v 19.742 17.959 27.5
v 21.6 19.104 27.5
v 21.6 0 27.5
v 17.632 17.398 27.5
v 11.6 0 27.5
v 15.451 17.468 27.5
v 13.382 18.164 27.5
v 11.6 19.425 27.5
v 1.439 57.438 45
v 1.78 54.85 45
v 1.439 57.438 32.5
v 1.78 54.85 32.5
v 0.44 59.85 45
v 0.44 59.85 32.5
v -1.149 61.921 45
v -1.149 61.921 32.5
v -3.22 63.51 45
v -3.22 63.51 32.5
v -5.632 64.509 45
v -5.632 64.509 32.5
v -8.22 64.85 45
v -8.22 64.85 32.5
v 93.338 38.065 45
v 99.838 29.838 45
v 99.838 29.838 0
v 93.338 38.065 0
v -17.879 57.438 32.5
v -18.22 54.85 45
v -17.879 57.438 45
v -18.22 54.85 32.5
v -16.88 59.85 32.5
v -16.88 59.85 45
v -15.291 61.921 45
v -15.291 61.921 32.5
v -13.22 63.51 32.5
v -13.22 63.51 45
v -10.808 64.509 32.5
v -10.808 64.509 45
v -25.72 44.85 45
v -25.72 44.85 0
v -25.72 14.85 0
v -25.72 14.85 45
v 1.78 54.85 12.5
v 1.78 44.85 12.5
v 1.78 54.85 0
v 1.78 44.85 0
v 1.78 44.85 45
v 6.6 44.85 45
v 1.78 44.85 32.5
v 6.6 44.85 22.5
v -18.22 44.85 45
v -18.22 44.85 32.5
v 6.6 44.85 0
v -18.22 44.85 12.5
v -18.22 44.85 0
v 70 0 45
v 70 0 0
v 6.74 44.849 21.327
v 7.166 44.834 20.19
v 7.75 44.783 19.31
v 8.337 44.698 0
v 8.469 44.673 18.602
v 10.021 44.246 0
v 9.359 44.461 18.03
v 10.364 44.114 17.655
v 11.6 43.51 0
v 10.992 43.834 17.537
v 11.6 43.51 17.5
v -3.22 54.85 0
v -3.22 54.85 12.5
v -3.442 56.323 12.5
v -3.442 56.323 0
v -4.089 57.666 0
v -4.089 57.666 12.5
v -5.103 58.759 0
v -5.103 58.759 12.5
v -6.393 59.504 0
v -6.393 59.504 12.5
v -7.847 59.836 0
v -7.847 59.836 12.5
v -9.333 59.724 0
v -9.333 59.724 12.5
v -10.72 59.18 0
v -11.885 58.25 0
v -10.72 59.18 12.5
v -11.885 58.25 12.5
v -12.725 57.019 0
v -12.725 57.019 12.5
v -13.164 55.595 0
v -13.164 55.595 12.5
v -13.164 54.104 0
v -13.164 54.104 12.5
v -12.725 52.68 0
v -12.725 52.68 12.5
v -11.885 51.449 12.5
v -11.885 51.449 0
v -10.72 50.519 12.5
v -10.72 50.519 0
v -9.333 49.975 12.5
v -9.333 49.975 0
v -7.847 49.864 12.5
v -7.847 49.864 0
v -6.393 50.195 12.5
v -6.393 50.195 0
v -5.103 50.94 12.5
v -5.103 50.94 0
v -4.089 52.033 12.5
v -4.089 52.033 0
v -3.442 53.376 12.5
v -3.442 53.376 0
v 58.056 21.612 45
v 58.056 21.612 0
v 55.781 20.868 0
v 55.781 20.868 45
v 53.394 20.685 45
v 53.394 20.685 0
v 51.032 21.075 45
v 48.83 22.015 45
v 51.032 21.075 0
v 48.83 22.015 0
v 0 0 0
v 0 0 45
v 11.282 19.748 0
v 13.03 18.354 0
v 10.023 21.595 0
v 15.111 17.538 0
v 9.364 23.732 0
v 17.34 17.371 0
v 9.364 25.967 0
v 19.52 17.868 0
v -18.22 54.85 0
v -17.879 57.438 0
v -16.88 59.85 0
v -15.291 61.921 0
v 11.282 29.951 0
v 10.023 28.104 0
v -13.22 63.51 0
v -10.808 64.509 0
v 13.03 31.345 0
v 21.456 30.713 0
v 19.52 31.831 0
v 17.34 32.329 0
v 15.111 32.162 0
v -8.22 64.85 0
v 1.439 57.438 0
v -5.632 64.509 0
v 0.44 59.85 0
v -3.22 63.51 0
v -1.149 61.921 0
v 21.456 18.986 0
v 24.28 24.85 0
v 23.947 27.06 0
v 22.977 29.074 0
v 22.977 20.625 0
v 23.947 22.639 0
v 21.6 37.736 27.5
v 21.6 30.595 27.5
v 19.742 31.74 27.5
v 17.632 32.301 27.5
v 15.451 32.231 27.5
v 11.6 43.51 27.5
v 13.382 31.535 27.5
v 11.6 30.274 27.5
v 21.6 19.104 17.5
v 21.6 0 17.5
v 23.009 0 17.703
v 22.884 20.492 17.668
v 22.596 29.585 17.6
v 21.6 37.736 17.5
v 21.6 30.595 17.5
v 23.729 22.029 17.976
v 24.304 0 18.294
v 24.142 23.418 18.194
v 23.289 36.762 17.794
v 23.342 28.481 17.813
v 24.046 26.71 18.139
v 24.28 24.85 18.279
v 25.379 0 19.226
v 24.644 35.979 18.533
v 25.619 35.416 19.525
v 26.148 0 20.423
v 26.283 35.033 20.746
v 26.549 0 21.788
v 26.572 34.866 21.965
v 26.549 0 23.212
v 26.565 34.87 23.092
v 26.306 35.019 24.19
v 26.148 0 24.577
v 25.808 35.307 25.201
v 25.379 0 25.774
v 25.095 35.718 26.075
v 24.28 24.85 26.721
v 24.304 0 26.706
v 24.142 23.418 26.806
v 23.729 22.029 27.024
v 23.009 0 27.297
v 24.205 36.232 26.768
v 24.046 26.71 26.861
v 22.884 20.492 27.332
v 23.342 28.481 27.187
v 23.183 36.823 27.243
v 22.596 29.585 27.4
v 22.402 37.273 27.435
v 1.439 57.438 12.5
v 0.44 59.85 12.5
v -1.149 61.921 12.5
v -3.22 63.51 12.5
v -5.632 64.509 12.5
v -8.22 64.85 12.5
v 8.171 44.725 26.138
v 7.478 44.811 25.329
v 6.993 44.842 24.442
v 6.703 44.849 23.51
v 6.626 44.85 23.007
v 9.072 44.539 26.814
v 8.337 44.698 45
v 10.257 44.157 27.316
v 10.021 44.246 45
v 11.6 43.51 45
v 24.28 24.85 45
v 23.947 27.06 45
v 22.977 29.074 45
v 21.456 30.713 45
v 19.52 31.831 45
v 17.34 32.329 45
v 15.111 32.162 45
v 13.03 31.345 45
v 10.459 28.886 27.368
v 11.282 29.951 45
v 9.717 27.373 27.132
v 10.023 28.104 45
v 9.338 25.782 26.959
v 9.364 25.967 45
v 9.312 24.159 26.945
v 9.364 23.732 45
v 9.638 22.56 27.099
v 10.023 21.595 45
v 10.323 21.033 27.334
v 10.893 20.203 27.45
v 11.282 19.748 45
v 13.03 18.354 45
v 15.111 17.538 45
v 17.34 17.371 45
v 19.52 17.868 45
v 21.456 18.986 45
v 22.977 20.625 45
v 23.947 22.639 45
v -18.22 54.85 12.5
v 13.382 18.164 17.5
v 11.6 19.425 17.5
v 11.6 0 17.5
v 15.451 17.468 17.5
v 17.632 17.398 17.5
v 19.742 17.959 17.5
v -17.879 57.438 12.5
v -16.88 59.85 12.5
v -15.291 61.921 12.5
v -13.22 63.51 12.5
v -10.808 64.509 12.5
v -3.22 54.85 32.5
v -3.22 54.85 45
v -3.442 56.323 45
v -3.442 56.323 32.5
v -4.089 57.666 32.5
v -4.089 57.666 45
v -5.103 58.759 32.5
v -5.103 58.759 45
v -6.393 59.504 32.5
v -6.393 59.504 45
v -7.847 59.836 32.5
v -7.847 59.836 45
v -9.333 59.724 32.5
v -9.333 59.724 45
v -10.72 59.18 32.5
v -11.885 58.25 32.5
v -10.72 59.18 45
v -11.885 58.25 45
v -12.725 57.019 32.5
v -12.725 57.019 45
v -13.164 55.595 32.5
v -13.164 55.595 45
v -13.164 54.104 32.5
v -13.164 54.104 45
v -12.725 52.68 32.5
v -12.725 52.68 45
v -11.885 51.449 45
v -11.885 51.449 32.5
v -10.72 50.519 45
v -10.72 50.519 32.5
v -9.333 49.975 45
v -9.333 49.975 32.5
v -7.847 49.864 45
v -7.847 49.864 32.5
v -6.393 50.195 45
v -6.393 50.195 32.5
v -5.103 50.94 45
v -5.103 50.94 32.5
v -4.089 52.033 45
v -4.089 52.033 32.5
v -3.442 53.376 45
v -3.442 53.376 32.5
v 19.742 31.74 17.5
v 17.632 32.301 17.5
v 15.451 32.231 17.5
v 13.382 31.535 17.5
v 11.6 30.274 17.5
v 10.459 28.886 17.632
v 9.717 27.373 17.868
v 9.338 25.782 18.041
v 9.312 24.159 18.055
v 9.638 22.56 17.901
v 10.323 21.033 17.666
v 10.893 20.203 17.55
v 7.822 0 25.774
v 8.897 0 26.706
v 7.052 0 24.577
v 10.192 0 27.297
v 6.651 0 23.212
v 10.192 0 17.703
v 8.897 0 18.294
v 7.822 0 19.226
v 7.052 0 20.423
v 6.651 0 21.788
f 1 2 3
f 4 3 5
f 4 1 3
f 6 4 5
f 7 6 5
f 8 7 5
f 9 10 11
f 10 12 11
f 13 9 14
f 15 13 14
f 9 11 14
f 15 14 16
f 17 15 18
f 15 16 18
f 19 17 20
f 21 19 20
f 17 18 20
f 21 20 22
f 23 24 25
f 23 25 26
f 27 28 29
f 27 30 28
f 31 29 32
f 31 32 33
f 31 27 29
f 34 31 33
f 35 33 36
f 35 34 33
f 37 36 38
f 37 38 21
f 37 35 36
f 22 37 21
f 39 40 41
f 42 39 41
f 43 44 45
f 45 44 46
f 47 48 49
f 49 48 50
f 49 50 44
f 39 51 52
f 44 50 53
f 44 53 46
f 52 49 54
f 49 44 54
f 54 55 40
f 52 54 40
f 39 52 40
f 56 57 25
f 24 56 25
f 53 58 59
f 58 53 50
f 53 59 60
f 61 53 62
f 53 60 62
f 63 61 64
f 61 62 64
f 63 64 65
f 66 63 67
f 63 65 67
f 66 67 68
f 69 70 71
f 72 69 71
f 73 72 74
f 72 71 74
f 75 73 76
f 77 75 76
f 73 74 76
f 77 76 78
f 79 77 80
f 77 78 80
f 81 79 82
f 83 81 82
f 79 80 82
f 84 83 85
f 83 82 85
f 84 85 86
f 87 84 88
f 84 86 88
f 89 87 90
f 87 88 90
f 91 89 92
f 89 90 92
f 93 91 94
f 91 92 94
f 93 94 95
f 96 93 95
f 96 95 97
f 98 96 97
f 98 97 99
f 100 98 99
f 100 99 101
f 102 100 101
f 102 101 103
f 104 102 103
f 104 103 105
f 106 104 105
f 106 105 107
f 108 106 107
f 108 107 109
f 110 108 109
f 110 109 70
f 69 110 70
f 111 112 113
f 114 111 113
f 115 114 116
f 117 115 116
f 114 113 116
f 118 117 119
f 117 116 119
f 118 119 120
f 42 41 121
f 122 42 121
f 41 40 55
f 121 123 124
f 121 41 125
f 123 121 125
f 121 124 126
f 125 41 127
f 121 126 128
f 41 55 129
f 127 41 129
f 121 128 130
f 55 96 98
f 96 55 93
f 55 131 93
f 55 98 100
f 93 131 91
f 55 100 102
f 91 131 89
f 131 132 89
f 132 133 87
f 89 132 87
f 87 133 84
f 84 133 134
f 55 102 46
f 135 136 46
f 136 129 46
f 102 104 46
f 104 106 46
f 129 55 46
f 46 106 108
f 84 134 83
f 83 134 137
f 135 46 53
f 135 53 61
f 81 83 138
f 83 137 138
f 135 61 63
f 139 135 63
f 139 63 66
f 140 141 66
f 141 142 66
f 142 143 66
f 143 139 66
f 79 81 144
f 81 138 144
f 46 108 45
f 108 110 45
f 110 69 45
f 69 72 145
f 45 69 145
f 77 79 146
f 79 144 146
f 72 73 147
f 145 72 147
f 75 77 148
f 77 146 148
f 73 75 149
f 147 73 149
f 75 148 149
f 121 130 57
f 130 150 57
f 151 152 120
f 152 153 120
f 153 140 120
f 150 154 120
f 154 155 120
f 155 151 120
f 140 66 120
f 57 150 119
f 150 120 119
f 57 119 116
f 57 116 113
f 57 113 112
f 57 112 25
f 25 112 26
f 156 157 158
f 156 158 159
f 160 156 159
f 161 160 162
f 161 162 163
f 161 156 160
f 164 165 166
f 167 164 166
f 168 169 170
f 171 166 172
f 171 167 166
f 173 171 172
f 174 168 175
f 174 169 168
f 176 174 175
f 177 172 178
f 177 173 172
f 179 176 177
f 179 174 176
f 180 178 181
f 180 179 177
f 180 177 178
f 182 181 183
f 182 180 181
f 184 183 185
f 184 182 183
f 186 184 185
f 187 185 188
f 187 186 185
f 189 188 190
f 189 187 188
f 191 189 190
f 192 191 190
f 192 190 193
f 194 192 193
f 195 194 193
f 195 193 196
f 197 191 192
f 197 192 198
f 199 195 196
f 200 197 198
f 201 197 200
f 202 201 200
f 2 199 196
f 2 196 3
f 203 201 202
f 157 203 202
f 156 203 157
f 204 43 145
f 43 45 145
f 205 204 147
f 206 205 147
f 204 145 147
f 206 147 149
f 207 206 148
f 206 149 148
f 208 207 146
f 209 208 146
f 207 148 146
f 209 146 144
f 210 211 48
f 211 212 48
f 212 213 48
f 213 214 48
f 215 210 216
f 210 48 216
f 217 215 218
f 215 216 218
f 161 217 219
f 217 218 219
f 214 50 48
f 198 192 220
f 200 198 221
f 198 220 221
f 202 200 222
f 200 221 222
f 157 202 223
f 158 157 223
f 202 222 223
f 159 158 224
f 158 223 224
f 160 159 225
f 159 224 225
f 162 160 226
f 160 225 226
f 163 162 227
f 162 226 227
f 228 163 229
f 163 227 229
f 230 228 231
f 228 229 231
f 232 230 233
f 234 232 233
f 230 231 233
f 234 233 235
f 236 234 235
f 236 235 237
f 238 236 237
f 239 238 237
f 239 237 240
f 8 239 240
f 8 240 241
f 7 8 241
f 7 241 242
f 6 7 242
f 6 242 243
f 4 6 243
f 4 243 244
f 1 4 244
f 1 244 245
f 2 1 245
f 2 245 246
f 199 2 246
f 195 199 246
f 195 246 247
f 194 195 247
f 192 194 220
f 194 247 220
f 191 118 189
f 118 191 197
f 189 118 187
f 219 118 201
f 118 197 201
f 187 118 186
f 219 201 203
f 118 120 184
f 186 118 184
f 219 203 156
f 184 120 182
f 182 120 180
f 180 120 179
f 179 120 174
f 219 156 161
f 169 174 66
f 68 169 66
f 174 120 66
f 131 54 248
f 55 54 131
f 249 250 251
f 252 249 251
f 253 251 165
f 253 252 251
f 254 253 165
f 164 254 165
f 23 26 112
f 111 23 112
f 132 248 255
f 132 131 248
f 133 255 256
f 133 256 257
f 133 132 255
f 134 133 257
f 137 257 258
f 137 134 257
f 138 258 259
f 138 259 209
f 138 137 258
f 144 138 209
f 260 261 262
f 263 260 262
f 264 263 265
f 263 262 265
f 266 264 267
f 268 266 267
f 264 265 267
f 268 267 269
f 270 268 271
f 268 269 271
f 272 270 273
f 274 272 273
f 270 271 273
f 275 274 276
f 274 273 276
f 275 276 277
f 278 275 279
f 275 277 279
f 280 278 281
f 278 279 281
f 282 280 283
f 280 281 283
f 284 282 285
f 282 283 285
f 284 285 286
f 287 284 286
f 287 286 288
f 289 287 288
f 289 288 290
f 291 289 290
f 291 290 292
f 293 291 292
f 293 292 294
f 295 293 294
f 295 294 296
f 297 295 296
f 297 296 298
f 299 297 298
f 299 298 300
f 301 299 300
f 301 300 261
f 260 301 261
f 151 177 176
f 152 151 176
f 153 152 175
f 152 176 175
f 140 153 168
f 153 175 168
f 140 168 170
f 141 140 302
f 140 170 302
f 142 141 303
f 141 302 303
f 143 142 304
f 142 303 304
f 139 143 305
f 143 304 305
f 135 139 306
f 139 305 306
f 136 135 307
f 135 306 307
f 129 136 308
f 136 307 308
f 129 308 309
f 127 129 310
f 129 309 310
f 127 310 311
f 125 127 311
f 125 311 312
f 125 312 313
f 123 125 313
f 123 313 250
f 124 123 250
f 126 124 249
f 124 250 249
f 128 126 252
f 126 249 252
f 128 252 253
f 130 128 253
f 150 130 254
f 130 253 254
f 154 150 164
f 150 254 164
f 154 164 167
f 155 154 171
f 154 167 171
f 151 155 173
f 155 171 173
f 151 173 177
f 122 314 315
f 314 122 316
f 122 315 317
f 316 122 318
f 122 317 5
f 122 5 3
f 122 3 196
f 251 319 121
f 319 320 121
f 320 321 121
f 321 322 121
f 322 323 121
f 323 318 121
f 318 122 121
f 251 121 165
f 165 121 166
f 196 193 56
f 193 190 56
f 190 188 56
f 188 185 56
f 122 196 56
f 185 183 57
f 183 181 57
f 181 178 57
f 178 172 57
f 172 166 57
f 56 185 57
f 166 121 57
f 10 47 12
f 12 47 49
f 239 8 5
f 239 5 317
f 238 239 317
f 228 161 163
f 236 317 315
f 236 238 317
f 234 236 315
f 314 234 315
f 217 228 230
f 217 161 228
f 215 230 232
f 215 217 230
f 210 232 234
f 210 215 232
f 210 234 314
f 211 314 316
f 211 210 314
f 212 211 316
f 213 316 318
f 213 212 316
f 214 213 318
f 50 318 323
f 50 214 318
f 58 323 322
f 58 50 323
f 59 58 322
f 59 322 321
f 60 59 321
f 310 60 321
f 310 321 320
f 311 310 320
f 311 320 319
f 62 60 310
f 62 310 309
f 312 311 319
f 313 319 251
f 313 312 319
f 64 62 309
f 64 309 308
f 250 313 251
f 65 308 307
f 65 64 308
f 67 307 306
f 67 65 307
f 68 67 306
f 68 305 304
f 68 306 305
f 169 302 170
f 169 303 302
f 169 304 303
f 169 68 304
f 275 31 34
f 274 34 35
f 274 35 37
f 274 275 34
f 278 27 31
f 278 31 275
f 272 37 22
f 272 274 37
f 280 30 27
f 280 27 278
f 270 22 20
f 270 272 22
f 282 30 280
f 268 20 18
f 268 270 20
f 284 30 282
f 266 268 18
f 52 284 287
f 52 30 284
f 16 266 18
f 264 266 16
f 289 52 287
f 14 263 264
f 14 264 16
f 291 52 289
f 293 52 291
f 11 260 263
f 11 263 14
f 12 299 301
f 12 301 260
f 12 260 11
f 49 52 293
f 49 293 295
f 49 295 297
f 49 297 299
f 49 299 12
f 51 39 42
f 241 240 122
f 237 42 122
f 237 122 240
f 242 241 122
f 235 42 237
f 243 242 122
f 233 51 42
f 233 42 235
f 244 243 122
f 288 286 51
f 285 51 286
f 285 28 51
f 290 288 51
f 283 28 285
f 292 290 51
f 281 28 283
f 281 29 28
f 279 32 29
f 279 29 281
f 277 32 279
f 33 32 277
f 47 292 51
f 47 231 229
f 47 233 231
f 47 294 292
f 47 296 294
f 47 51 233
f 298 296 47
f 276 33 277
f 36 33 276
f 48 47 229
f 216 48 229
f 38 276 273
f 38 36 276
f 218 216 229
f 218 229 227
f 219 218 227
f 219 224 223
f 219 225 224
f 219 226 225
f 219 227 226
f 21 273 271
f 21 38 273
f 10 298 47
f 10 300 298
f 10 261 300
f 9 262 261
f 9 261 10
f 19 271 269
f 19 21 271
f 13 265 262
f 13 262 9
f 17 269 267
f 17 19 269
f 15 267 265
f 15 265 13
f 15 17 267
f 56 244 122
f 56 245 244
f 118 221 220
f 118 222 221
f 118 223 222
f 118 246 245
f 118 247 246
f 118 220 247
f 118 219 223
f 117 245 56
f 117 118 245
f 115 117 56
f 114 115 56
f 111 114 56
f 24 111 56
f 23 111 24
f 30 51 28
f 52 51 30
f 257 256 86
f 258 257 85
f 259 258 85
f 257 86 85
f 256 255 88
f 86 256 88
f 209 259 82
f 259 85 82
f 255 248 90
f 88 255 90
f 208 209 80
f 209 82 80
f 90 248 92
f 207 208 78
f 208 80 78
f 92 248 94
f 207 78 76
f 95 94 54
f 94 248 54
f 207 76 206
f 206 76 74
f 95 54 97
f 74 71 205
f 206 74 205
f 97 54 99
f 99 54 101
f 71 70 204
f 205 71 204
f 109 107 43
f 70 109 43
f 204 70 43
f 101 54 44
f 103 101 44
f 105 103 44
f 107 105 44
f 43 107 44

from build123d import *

# Parameters (mm, degrees)
BOSS_EXTRUDE1_DEPTH = 45
SKETCH2_W           = 20
SKETCH2_H           = 12.5
BOSS_EXTRUDE2_DEPTH = 20
FILLET1_R           = 10
FILLET2_R           = 10
SKETCH3_R           = 5
CUT_EXTRUDE1_DEPTH  = 50
CUT_EXTRUDE2_DEPTH  = 55
SKETCH5_R           = 7.5
CUT_EXTRUDE3_DEPTH  = 55


with BuildPart() as part:
    # Sketch1 → Boss-Extrude1 (new body)
    with BuildSketch(Plane.XY):
        with BuildLine():
            Line((0, 0), (70, 0))
            Line((70, 0), (99.838459525, 29.838459525))
            Line((99.838459525, 29.838459525), (93.338433206, 38.064606978))
            Line((93.338433206, 38.064606978), (58.056372922, 21.612312072))
            ThreePointArc((58.056372922, 21.612312072), (53.393996431, 20.684907727), (48.830190304, 22.015135905))
            Line((48.830190304, 22.015135905), (9.27982655, 44.849549065))
            Line((9.27982655, 44.849549065), (-25.72017345, 44.849549065))
            Line((-25.72017345, 44.849549065), (-25.72017345, 14.849549065))
            Line((-25.72017345, 14.849549065), (0, 0))
        make_face()
    extrude(amount=BOSS_EXTRUDE1_DEPTH)

    # Sketch2 → Boss-Extrude2 (add)
    with BuildSketch(Plane(origin=(0, 44.849549065, 0), x_dir=(1, 0, 0), z_dir=(0, 1, 0))):
        with Locations((-8.22017345, -6.25)):
            Rectangle(SKETCH2_W, SKETCH2_H)
        with Locations((-8.22017345, -38.75)):
            Rectangle(SKETCH2_W, SKETCH2_H)
    extrude(amount=BOSS_EXTRUDE2_DEPTH)

    # Fillet1
    fillet1_edges = [part.edges().sort_by_distance(p)[0] for p in [
        (1.77982655, 64.849549065, 38.75),
        (-18.22017345, 64.849549065, 38.75),
        (1.77982655, 64.849549065, 6.25),
        (-18.22017345, 64.849549065, 6.25),
    ]]
    fillet(fillet1_edges, radius=FILLET1_R - 0.0001)  # a hair under: the kernel refuses the full size

    # Fillet2
    fillet2_edges = [part.edges().sort_by_distance(p)[0] for p in [
        (9.27982655, 44.849549065, 22.5),
    ]]
    fillet(fillet2_edges, radius=FILLET2_R)

    # Sketch3 → Cut-Extrude1 (cut)
    with BuildSketch(Plane.XY.offset(45)):
        with Locations((-8.22017345, 54.849549065)):
            Circle(SKETCH3_R)
    extrude(amount=-CUT_EXTRUDE1_DEPTH, mode=Mode.SUBTRACT)

    # Sketch4 → Cut-Extrude2 (cut)
    with BuildSketch(Plane(origin=(0, 44.849549065, 0), x_dir=(1, 0, 0), z_dir=(0, 1, 0))):
        with BuildLine():
            Line((11.600334626, -17.5), (21.600334626, -17.5))
            ThreePointArc((21.600334626, -17.5), (26.600334626, -22.5), (21.600334626, -27.5))
            Line((21.600334626, -27.5), (11.600334626, -27.5))
            ThreePointArc((11.600334626, -27.5), (6.600334626, -22.5), (11.600334626, -17.5))
        make_face()
    extrude(amount=-CUT_EXTRUDE2_DEPTH, mode=Mode.SUBTRACT)

    # Sketch5 → Cut-Extrude3 (cut)
    with BuildSketch(Plane.XY.offset(45)):
        with Locations((16.77982655, 24.849549065)):
            Circle(SKETCH5_R)
    extrude(amount=-CUT_EXTRUDE3_DEPTH, mode=Mode.SUBTRACT)


solid = part.part
